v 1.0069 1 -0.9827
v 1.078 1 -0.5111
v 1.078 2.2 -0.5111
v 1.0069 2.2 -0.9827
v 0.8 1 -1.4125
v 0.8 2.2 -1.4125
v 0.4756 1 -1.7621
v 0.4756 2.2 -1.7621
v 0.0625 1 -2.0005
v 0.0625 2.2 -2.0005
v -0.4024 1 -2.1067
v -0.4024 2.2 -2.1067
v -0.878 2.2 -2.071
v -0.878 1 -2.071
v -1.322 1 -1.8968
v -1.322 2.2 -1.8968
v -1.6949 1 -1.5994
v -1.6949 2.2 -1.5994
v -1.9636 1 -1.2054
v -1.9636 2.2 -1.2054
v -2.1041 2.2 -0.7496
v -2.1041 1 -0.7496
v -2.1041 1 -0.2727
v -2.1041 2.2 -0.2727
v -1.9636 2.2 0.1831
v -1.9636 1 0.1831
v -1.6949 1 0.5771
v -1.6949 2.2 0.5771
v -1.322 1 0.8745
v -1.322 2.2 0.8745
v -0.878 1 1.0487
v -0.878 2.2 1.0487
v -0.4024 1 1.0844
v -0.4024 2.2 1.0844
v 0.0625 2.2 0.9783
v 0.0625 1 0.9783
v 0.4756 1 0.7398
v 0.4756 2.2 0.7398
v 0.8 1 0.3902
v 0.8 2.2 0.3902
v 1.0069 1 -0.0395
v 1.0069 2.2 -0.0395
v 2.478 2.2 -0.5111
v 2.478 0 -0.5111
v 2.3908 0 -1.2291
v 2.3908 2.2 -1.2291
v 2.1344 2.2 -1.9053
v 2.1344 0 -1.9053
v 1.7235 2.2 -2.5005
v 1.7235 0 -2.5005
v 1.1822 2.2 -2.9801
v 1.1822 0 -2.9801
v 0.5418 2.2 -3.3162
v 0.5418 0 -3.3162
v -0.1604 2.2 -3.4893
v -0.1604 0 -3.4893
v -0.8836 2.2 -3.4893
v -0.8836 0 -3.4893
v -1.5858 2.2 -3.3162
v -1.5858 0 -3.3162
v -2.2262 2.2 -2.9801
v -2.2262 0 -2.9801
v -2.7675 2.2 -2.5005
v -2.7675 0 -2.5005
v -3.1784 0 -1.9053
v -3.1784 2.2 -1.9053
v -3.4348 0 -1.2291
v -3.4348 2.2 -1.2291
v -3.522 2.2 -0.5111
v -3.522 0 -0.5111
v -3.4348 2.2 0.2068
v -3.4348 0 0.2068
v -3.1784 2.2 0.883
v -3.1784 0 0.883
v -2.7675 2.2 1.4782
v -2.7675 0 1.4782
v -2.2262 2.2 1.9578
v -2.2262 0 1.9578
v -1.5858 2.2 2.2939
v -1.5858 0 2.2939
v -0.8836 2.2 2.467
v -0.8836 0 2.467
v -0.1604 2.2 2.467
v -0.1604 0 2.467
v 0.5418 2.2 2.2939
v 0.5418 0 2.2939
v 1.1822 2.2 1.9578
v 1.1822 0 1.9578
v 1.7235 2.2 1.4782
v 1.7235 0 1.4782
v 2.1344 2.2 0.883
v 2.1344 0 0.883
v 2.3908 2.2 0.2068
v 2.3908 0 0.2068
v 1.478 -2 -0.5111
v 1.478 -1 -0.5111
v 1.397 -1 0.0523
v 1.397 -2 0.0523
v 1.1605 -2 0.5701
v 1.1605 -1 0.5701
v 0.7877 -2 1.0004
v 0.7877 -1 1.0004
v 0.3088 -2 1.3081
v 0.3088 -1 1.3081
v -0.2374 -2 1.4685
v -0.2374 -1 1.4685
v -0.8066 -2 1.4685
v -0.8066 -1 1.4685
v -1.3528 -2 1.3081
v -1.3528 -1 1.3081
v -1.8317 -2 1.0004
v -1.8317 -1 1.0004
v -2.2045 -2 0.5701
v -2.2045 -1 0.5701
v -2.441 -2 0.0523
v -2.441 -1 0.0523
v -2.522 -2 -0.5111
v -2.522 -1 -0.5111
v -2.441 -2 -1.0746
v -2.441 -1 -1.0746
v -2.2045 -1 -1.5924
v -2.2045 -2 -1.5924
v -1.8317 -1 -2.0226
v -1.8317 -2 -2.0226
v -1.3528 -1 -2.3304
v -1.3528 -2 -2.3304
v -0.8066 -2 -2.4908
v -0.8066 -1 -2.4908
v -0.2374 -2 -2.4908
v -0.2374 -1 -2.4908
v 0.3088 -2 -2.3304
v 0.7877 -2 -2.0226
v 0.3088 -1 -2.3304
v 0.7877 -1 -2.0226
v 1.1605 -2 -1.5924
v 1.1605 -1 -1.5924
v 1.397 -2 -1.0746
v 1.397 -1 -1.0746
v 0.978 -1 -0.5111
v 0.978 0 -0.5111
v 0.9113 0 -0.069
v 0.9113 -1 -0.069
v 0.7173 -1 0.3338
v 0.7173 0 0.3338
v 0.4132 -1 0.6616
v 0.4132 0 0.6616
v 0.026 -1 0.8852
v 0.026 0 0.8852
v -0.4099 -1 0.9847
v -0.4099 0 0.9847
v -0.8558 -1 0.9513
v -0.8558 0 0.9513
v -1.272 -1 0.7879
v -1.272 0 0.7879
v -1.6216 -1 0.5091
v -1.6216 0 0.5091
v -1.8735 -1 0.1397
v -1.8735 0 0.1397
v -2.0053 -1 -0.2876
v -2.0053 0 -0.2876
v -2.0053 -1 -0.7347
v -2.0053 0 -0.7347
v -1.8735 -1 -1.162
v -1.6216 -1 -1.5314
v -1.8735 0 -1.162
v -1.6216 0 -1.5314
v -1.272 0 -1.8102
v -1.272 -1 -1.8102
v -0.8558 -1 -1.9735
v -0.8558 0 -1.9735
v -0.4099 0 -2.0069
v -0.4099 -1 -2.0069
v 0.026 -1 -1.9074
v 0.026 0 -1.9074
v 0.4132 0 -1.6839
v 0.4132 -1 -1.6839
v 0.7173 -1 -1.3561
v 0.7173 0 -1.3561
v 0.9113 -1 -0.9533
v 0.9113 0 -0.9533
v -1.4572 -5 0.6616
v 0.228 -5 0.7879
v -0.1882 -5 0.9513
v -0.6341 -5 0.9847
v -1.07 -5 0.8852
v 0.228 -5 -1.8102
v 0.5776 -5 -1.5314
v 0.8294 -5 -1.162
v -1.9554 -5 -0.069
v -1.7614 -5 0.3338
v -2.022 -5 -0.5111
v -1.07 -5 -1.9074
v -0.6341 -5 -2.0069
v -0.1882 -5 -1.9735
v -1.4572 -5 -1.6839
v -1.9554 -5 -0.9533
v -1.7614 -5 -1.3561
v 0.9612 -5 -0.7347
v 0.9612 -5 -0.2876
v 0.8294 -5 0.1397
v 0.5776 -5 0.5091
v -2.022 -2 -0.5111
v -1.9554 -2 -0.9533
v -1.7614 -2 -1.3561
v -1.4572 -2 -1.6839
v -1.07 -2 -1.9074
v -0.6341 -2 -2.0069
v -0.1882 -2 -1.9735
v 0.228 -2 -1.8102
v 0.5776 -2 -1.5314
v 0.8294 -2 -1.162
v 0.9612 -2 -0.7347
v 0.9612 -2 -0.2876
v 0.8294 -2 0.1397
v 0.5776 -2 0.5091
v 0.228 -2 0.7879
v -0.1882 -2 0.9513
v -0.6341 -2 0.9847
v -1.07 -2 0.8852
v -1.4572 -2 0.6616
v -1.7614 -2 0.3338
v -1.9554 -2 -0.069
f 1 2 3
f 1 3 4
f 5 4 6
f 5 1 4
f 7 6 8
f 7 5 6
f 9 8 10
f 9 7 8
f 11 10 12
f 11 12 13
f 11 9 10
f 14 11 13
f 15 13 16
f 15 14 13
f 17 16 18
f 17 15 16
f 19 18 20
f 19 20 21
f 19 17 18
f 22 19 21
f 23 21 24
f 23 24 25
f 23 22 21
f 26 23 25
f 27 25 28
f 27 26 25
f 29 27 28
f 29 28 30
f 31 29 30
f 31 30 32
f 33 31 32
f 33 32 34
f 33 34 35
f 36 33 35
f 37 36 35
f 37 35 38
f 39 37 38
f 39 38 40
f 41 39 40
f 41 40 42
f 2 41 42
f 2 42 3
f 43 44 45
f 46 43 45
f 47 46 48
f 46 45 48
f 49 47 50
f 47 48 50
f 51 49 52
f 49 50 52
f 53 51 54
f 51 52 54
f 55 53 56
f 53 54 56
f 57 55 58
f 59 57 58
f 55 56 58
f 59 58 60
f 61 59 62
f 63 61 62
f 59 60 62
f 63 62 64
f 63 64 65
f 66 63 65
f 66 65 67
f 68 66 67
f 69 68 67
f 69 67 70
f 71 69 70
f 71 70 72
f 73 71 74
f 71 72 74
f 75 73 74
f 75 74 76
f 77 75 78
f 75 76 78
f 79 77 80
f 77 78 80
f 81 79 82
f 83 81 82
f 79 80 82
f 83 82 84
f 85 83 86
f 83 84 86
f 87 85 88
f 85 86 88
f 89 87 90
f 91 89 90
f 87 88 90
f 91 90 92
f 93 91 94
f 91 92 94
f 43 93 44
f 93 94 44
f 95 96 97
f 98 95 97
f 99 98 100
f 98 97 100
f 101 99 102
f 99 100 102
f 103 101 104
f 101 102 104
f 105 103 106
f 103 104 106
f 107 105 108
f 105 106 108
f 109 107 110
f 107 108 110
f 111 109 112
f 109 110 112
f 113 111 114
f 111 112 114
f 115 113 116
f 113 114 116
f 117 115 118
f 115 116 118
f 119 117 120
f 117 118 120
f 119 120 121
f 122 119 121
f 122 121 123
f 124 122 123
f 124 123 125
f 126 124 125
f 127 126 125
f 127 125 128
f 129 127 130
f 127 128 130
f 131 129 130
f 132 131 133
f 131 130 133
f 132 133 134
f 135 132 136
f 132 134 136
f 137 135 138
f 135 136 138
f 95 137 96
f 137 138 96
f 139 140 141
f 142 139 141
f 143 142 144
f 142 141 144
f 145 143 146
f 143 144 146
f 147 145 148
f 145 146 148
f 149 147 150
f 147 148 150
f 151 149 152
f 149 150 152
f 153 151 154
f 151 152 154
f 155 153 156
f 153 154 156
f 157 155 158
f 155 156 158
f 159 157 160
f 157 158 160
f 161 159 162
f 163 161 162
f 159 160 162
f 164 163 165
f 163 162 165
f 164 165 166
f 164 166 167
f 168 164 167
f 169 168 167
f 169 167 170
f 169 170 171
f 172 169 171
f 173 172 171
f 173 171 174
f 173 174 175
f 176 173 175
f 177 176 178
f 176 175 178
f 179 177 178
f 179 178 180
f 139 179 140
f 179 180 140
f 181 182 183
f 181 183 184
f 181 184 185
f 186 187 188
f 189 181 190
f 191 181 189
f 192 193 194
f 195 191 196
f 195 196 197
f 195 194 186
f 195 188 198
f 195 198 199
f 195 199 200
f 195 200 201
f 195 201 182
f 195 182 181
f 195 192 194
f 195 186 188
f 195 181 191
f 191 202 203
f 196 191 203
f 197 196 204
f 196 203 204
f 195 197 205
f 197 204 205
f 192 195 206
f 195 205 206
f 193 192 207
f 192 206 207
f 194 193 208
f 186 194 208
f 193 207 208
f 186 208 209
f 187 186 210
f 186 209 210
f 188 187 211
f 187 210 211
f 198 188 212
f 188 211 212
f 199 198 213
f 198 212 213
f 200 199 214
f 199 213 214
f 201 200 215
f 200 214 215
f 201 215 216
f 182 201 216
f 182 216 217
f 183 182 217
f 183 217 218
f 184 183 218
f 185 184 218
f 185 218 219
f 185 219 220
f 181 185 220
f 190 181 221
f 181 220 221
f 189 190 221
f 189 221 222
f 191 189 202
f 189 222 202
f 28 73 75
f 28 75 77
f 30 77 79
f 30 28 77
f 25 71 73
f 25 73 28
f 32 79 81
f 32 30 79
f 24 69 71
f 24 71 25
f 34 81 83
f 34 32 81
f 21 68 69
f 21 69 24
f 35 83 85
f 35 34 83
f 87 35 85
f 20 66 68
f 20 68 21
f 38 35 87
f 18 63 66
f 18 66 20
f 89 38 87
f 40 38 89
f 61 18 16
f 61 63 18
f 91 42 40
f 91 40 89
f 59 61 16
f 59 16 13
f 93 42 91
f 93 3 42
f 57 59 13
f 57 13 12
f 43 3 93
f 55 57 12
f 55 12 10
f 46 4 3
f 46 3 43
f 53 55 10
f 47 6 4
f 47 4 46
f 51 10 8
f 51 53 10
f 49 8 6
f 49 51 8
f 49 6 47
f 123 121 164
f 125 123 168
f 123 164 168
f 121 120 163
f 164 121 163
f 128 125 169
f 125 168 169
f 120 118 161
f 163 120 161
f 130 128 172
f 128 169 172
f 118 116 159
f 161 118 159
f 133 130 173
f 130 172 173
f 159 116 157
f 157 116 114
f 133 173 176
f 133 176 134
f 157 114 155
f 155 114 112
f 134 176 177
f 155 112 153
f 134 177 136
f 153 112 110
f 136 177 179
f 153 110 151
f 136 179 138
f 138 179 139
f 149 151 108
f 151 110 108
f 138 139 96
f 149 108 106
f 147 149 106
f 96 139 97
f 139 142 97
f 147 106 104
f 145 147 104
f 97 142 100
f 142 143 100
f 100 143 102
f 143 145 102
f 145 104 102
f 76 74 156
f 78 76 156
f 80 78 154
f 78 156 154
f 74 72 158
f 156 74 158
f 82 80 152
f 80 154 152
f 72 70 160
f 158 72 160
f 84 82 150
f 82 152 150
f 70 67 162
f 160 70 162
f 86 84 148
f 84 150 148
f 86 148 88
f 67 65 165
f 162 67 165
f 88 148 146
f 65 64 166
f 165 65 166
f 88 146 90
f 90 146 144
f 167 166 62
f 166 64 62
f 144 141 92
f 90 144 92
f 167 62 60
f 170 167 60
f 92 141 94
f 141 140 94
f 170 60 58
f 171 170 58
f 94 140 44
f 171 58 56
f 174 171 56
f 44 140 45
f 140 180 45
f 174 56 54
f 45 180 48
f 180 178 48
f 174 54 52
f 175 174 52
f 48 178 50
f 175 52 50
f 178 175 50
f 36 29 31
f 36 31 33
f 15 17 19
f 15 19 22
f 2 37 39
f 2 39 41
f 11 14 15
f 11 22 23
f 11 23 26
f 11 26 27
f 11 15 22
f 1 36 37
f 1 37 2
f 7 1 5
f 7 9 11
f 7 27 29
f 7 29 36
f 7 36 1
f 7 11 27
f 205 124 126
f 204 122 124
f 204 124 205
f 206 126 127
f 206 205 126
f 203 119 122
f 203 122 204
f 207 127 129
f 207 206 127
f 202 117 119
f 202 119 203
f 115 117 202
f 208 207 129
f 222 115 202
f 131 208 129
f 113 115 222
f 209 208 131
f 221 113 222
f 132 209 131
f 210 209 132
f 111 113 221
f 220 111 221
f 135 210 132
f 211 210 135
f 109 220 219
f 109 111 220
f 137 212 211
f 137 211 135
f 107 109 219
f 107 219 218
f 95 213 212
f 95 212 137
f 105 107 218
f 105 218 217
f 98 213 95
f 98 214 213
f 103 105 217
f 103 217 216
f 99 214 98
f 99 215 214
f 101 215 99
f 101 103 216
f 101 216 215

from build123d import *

# Parameters (mm, degrees)
SKETCH1_R           = 3
SKETCH1_R_2         = 1.6
BOSS_EXTRUDE1_DEPTH = 2.2
SKETCH1_3_R         = 1.6
BOSS_EXTRUDE2_DEPTH = 1
SKETCH5_R           = 1.5
BOSS_EXTRUDE3_DEPTH = 1
SKETCH6_R           = 2
BOSS_EXTRUDE4_DEPTH = 1
SKETCH8_R           = 1.5
BOSS_EXTRUDE5_DEPTH = 3


with BuildPart() as part:
    # Sketch1 → Boss-Extrude1 (new body)
    with BuildSketch(Plane(origin=(0, 0, 0), x_dir=(1, 0, 0), z_dir=(0, 1, 0))):
        with Locations((-0.522013312, 0.511138034)):
            Circle(SKETCH1_R)
        with Locations((-0.522013312, 0.511138034)):
            Circle(SKETCH1_R_2, mode=Mode.SUBTRACT)
    extrude(amount=BOSS_EXTRUDE1_DEPTH)

    # Sketch1<3> → Boss-Extrude2 (add)
    with BuildSketch(Plane(origin=(0, 0, 0), x_dir=(1, 0, 0), z_dir=(0, 1, 0))):
        with Locations((-0.522013312, 0.511138034)):
            Circle(SKETCH1_3_R)
    extrude(amount=BOSS_EXTRUDE2_DEPTH)

    # Sketch5 → Boss-Extrude3 (add)
    with BuildSketch(Plane.XZ):
        with Locations((-0.522013312, -0.511138034)):
            Circle(SKETCH5_R)
    extrude(amount=BOSS_EXTRUDE3_DEPTH)

    # Sketch6 → Boss-Extrude4 (add)
    with BuildSketch(Plane.XZ.offset(1)):
        with Locations((-0.522013312, -0.511138034)):
            Circle(SKETCH6_R)
    extrude(amount=BOSS_EXTRUDE4_DEPTH)

    # Sketch8 → Boss-Extrude5 (add)
    with BuildSketch(Plane(origin=(0, -2, 0), x_dir=(-1, 0, 0), z_dir=(0, -1, 0))):
        with Locations((0.522013312, 0.511138034)):
            Circle(SKETCH8_R)
    extrude(amount=BOSS_EXTRUDE5_DEPTH)


solid = part.part
